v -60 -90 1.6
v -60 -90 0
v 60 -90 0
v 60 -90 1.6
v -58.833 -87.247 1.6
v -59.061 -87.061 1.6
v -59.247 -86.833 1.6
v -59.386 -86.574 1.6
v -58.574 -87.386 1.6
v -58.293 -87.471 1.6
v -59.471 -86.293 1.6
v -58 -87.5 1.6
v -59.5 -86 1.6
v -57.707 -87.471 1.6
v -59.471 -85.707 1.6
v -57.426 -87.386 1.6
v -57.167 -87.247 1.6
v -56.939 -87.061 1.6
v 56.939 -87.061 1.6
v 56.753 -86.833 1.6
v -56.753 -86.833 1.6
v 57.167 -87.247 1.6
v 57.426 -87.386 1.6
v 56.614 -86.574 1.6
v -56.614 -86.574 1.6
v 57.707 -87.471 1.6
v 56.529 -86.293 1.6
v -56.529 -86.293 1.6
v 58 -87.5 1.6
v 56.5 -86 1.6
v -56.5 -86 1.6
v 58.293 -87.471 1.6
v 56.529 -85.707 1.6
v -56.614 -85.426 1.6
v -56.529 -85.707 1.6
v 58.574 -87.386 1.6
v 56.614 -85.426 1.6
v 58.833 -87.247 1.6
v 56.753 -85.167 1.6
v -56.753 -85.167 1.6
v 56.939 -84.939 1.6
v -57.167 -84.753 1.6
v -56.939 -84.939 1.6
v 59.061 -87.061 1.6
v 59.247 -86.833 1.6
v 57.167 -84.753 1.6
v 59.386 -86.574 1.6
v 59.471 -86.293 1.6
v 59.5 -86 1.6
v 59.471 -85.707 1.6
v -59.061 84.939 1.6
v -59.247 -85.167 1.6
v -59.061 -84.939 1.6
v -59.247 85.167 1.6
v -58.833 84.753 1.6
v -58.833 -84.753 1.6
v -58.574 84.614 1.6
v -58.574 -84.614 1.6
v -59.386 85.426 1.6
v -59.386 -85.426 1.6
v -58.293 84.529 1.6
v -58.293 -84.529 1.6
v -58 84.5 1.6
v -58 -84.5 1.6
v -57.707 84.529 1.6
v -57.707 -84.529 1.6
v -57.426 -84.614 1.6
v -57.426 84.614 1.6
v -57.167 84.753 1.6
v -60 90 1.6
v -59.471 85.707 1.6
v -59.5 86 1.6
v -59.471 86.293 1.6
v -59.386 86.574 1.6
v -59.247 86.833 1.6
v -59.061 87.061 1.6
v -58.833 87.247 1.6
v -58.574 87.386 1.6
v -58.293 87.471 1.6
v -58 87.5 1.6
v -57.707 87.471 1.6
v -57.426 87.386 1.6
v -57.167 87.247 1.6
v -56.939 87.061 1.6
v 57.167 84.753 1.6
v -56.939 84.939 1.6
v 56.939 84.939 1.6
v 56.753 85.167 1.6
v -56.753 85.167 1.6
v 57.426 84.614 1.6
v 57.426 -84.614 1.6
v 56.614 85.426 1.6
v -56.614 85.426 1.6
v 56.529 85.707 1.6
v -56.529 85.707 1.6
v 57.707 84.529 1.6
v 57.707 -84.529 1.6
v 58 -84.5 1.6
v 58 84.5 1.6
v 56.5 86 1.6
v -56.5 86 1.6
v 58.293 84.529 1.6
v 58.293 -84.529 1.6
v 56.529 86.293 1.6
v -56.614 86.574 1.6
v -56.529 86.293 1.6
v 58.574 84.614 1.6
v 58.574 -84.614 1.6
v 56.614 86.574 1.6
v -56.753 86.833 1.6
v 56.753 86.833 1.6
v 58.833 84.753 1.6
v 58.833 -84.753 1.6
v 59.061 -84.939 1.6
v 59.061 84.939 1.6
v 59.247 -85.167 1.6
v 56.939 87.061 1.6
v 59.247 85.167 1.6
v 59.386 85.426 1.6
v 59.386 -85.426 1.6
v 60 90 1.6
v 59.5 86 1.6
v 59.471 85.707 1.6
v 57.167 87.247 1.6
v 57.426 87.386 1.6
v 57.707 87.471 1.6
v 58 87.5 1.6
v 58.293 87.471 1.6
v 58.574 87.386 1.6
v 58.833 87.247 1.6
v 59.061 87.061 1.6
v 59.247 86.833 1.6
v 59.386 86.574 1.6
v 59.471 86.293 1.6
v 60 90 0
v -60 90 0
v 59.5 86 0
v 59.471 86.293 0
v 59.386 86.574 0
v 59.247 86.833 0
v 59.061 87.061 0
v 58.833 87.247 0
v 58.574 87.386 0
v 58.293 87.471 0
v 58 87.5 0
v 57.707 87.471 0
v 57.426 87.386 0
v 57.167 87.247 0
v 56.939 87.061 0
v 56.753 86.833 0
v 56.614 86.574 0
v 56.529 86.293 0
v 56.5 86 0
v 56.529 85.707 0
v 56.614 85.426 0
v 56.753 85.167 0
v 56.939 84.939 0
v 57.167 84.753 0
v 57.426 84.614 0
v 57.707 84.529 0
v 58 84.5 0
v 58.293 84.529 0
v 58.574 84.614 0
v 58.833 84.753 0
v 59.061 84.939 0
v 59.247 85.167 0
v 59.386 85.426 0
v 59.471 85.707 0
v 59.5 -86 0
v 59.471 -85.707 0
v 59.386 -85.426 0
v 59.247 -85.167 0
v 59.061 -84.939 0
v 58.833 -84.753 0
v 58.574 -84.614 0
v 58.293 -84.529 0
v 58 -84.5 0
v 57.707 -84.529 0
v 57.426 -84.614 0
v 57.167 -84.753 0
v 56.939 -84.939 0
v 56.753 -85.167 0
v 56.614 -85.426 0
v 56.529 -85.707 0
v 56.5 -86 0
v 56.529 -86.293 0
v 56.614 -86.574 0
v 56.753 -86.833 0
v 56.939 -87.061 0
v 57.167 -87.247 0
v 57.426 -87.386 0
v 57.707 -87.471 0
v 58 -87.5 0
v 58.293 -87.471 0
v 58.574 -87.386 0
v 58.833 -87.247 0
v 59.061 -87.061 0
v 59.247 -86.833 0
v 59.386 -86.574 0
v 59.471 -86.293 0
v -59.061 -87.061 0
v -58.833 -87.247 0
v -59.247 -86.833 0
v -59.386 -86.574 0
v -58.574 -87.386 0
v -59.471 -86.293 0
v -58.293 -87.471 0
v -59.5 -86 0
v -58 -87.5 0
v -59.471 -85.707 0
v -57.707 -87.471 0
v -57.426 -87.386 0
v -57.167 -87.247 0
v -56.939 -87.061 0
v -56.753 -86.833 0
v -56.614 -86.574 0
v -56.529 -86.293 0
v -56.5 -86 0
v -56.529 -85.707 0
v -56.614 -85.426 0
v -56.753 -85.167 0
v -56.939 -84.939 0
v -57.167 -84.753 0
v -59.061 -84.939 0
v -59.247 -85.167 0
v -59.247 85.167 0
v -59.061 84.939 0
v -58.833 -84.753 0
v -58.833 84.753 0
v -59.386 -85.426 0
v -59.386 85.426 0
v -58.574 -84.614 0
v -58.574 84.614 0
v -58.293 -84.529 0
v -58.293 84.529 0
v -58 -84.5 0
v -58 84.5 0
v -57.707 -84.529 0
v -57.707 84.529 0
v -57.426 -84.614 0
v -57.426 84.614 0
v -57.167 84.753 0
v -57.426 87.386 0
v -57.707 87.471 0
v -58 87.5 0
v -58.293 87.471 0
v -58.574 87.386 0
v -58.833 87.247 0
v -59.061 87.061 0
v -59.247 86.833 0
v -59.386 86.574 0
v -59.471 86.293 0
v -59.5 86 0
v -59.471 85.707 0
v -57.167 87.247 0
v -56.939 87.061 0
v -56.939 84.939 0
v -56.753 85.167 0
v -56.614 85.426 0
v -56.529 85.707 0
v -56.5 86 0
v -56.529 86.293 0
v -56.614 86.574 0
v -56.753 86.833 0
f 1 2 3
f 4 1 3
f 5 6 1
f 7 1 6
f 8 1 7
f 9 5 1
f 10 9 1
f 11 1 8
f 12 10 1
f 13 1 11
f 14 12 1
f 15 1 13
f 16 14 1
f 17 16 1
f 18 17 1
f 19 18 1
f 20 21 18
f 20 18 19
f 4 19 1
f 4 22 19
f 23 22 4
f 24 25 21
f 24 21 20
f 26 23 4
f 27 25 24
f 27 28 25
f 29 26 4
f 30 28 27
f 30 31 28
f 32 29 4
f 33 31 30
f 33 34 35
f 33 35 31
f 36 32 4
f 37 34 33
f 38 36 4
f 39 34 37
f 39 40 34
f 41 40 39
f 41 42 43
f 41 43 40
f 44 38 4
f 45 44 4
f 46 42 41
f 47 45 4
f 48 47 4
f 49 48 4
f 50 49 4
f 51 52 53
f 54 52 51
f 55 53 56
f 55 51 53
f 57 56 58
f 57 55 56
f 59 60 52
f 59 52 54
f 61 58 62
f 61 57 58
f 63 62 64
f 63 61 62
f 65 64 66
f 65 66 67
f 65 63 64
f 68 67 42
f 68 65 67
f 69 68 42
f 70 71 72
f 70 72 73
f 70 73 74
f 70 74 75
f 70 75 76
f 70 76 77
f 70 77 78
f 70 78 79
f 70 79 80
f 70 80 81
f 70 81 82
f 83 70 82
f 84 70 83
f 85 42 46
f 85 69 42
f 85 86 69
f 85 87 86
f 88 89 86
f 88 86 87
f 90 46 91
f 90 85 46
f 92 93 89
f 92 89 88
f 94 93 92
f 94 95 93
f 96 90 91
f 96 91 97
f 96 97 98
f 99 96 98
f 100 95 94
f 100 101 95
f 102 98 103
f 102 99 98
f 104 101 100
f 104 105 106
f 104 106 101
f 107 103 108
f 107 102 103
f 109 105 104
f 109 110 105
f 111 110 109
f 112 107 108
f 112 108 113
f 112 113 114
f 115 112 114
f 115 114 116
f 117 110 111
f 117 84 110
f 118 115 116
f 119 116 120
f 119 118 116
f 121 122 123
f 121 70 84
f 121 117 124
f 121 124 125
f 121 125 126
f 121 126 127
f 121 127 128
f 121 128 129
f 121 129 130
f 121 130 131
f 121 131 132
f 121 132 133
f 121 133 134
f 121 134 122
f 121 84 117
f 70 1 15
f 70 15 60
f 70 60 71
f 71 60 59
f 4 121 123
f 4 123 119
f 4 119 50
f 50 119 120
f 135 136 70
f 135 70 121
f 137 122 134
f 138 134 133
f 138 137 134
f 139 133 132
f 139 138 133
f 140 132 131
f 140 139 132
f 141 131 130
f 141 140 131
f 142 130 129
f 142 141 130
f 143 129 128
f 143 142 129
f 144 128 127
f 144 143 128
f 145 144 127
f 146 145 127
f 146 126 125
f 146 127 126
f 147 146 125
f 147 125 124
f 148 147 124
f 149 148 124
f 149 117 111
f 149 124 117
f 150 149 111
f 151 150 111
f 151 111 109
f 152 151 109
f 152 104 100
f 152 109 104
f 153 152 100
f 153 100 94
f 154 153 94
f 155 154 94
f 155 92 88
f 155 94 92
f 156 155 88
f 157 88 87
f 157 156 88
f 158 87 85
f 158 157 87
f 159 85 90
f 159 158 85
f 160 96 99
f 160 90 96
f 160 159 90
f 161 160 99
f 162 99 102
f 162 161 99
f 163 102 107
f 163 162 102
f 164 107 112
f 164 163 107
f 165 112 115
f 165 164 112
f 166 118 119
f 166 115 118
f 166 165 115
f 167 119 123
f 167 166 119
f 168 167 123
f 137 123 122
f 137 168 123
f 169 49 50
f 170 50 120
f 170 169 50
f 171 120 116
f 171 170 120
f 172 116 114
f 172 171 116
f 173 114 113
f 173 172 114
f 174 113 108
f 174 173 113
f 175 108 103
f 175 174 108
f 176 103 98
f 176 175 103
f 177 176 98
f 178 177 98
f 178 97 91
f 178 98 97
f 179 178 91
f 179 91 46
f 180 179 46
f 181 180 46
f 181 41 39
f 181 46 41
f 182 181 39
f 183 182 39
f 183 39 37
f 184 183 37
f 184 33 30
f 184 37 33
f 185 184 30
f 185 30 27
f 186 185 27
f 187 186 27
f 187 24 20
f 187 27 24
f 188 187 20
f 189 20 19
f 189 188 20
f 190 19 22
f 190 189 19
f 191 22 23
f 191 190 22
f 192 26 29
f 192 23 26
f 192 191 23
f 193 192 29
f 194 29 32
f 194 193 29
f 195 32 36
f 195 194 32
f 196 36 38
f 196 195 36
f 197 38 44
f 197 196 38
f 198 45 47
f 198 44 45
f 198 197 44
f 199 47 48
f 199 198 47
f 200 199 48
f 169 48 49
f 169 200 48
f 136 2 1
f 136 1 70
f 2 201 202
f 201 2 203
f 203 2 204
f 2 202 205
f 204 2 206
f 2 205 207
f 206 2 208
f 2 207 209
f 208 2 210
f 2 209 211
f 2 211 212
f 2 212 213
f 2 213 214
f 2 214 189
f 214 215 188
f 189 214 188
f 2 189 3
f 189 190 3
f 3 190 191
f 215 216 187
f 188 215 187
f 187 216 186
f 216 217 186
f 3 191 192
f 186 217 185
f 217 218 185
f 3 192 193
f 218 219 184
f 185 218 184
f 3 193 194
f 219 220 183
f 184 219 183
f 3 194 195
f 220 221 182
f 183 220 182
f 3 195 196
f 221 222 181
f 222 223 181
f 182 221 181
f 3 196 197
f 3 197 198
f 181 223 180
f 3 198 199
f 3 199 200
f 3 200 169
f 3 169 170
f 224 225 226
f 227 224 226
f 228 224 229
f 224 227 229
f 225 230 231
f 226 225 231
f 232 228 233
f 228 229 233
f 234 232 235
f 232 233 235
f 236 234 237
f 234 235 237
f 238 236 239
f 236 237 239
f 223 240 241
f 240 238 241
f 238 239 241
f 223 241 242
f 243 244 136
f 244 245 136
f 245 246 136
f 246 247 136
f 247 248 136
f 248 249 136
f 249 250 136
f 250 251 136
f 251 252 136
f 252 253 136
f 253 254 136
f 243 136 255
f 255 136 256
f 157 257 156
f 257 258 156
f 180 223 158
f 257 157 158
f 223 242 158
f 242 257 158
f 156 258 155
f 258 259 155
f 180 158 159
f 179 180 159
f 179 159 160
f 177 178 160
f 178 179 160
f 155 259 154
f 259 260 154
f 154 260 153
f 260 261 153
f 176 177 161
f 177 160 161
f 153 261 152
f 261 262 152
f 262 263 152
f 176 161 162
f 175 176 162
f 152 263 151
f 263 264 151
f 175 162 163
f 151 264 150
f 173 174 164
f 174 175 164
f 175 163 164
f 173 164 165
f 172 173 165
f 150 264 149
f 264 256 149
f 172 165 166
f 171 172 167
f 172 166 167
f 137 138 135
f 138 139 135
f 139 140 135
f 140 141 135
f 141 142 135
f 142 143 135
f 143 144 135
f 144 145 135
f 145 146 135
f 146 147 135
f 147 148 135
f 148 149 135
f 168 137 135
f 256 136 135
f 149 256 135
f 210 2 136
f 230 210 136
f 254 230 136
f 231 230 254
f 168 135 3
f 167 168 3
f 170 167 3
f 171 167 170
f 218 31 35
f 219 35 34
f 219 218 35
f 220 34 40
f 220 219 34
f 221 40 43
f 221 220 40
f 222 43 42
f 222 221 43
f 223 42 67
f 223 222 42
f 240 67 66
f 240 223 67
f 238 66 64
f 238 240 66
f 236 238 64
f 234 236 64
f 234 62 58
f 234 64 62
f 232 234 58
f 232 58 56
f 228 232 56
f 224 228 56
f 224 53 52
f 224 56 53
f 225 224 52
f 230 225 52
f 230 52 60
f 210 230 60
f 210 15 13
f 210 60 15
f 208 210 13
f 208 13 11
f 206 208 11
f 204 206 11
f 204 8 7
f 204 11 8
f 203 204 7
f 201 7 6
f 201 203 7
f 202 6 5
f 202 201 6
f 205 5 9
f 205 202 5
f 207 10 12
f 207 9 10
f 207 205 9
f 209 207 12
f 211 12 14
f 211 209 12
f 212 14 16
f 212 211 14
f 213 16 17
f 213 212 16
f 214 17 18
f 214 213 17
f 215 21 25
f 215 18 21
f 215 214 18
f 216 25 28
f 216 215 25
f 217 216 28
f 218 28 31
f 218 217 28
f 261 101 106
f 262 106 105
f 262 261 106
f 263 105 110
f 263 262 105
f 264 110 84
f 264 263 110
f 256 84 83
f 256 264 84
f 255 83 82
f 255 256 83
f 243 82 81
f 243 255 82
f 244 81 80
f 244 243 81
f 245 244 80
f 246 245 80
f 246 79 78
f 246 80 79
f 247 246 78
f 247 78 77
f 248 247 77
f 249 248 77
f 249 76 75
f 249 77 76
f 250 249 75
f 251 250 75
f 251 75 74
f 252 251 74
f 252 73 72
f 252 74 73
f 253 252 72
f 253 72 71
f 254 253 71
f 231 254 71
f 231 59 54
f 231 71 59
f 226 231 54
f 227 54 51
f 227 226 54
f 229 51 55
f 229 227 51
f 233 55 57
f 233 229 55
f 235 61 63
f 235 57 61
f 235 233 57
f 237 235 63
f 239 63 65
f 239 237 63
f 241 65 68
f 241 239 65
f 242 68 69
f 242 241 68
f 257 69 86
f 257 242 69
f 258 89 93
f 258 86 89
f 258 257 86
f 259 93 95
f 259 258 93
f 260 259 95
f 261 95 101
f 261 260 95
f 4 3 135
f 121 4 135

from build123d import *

# Parameters (mm, degrees)
SKETCH1_W               = 120
SKETCH1_H               = 180
BOSS_EXTRUDE1_DEPTH     = 1.6
SKETCH2_R               = 1.5
CUT_EXTRUDE2_DEPTH      = 2.6
CUT_EXTRUDE2_DEPTH_BACK = 1


with BuildPart() as part:
    # Sketch1 → Boss-Extrude1 (new body)
    with BuildSketch(Plane.XY):
        Rectangle(SKETCH1_W, SKETCH1_H)
    extrude(amount=BOSS_EXTRUDE1_DEPTH)

    # Sketch2 → Cut-Extrude2 (cut, two sides)
    with BuildSketch(Plane.XY) as cut_extrude2_sk:
        with Locations((-58, 86)):
            Circle(SKETCH2_R)
        with Locations((58, 86)):
            Circle(SKETCH2_R)
        with Locations((58, -86)):
            Circle(SKETCH2_R)
        with Locations((-58, -86)):
            Circle(SKETCH2_R)
    extrude(amount=CUT_EXTRUDE2_DEPTH, mode=Mode.SUBTRACT)
    extrude(cut_extrude2_sk.sketch, amount=-CUT_EXTRUDE2_DEPTH_BACK, mode=Mode.SUBTRACT)


solid = part.part
